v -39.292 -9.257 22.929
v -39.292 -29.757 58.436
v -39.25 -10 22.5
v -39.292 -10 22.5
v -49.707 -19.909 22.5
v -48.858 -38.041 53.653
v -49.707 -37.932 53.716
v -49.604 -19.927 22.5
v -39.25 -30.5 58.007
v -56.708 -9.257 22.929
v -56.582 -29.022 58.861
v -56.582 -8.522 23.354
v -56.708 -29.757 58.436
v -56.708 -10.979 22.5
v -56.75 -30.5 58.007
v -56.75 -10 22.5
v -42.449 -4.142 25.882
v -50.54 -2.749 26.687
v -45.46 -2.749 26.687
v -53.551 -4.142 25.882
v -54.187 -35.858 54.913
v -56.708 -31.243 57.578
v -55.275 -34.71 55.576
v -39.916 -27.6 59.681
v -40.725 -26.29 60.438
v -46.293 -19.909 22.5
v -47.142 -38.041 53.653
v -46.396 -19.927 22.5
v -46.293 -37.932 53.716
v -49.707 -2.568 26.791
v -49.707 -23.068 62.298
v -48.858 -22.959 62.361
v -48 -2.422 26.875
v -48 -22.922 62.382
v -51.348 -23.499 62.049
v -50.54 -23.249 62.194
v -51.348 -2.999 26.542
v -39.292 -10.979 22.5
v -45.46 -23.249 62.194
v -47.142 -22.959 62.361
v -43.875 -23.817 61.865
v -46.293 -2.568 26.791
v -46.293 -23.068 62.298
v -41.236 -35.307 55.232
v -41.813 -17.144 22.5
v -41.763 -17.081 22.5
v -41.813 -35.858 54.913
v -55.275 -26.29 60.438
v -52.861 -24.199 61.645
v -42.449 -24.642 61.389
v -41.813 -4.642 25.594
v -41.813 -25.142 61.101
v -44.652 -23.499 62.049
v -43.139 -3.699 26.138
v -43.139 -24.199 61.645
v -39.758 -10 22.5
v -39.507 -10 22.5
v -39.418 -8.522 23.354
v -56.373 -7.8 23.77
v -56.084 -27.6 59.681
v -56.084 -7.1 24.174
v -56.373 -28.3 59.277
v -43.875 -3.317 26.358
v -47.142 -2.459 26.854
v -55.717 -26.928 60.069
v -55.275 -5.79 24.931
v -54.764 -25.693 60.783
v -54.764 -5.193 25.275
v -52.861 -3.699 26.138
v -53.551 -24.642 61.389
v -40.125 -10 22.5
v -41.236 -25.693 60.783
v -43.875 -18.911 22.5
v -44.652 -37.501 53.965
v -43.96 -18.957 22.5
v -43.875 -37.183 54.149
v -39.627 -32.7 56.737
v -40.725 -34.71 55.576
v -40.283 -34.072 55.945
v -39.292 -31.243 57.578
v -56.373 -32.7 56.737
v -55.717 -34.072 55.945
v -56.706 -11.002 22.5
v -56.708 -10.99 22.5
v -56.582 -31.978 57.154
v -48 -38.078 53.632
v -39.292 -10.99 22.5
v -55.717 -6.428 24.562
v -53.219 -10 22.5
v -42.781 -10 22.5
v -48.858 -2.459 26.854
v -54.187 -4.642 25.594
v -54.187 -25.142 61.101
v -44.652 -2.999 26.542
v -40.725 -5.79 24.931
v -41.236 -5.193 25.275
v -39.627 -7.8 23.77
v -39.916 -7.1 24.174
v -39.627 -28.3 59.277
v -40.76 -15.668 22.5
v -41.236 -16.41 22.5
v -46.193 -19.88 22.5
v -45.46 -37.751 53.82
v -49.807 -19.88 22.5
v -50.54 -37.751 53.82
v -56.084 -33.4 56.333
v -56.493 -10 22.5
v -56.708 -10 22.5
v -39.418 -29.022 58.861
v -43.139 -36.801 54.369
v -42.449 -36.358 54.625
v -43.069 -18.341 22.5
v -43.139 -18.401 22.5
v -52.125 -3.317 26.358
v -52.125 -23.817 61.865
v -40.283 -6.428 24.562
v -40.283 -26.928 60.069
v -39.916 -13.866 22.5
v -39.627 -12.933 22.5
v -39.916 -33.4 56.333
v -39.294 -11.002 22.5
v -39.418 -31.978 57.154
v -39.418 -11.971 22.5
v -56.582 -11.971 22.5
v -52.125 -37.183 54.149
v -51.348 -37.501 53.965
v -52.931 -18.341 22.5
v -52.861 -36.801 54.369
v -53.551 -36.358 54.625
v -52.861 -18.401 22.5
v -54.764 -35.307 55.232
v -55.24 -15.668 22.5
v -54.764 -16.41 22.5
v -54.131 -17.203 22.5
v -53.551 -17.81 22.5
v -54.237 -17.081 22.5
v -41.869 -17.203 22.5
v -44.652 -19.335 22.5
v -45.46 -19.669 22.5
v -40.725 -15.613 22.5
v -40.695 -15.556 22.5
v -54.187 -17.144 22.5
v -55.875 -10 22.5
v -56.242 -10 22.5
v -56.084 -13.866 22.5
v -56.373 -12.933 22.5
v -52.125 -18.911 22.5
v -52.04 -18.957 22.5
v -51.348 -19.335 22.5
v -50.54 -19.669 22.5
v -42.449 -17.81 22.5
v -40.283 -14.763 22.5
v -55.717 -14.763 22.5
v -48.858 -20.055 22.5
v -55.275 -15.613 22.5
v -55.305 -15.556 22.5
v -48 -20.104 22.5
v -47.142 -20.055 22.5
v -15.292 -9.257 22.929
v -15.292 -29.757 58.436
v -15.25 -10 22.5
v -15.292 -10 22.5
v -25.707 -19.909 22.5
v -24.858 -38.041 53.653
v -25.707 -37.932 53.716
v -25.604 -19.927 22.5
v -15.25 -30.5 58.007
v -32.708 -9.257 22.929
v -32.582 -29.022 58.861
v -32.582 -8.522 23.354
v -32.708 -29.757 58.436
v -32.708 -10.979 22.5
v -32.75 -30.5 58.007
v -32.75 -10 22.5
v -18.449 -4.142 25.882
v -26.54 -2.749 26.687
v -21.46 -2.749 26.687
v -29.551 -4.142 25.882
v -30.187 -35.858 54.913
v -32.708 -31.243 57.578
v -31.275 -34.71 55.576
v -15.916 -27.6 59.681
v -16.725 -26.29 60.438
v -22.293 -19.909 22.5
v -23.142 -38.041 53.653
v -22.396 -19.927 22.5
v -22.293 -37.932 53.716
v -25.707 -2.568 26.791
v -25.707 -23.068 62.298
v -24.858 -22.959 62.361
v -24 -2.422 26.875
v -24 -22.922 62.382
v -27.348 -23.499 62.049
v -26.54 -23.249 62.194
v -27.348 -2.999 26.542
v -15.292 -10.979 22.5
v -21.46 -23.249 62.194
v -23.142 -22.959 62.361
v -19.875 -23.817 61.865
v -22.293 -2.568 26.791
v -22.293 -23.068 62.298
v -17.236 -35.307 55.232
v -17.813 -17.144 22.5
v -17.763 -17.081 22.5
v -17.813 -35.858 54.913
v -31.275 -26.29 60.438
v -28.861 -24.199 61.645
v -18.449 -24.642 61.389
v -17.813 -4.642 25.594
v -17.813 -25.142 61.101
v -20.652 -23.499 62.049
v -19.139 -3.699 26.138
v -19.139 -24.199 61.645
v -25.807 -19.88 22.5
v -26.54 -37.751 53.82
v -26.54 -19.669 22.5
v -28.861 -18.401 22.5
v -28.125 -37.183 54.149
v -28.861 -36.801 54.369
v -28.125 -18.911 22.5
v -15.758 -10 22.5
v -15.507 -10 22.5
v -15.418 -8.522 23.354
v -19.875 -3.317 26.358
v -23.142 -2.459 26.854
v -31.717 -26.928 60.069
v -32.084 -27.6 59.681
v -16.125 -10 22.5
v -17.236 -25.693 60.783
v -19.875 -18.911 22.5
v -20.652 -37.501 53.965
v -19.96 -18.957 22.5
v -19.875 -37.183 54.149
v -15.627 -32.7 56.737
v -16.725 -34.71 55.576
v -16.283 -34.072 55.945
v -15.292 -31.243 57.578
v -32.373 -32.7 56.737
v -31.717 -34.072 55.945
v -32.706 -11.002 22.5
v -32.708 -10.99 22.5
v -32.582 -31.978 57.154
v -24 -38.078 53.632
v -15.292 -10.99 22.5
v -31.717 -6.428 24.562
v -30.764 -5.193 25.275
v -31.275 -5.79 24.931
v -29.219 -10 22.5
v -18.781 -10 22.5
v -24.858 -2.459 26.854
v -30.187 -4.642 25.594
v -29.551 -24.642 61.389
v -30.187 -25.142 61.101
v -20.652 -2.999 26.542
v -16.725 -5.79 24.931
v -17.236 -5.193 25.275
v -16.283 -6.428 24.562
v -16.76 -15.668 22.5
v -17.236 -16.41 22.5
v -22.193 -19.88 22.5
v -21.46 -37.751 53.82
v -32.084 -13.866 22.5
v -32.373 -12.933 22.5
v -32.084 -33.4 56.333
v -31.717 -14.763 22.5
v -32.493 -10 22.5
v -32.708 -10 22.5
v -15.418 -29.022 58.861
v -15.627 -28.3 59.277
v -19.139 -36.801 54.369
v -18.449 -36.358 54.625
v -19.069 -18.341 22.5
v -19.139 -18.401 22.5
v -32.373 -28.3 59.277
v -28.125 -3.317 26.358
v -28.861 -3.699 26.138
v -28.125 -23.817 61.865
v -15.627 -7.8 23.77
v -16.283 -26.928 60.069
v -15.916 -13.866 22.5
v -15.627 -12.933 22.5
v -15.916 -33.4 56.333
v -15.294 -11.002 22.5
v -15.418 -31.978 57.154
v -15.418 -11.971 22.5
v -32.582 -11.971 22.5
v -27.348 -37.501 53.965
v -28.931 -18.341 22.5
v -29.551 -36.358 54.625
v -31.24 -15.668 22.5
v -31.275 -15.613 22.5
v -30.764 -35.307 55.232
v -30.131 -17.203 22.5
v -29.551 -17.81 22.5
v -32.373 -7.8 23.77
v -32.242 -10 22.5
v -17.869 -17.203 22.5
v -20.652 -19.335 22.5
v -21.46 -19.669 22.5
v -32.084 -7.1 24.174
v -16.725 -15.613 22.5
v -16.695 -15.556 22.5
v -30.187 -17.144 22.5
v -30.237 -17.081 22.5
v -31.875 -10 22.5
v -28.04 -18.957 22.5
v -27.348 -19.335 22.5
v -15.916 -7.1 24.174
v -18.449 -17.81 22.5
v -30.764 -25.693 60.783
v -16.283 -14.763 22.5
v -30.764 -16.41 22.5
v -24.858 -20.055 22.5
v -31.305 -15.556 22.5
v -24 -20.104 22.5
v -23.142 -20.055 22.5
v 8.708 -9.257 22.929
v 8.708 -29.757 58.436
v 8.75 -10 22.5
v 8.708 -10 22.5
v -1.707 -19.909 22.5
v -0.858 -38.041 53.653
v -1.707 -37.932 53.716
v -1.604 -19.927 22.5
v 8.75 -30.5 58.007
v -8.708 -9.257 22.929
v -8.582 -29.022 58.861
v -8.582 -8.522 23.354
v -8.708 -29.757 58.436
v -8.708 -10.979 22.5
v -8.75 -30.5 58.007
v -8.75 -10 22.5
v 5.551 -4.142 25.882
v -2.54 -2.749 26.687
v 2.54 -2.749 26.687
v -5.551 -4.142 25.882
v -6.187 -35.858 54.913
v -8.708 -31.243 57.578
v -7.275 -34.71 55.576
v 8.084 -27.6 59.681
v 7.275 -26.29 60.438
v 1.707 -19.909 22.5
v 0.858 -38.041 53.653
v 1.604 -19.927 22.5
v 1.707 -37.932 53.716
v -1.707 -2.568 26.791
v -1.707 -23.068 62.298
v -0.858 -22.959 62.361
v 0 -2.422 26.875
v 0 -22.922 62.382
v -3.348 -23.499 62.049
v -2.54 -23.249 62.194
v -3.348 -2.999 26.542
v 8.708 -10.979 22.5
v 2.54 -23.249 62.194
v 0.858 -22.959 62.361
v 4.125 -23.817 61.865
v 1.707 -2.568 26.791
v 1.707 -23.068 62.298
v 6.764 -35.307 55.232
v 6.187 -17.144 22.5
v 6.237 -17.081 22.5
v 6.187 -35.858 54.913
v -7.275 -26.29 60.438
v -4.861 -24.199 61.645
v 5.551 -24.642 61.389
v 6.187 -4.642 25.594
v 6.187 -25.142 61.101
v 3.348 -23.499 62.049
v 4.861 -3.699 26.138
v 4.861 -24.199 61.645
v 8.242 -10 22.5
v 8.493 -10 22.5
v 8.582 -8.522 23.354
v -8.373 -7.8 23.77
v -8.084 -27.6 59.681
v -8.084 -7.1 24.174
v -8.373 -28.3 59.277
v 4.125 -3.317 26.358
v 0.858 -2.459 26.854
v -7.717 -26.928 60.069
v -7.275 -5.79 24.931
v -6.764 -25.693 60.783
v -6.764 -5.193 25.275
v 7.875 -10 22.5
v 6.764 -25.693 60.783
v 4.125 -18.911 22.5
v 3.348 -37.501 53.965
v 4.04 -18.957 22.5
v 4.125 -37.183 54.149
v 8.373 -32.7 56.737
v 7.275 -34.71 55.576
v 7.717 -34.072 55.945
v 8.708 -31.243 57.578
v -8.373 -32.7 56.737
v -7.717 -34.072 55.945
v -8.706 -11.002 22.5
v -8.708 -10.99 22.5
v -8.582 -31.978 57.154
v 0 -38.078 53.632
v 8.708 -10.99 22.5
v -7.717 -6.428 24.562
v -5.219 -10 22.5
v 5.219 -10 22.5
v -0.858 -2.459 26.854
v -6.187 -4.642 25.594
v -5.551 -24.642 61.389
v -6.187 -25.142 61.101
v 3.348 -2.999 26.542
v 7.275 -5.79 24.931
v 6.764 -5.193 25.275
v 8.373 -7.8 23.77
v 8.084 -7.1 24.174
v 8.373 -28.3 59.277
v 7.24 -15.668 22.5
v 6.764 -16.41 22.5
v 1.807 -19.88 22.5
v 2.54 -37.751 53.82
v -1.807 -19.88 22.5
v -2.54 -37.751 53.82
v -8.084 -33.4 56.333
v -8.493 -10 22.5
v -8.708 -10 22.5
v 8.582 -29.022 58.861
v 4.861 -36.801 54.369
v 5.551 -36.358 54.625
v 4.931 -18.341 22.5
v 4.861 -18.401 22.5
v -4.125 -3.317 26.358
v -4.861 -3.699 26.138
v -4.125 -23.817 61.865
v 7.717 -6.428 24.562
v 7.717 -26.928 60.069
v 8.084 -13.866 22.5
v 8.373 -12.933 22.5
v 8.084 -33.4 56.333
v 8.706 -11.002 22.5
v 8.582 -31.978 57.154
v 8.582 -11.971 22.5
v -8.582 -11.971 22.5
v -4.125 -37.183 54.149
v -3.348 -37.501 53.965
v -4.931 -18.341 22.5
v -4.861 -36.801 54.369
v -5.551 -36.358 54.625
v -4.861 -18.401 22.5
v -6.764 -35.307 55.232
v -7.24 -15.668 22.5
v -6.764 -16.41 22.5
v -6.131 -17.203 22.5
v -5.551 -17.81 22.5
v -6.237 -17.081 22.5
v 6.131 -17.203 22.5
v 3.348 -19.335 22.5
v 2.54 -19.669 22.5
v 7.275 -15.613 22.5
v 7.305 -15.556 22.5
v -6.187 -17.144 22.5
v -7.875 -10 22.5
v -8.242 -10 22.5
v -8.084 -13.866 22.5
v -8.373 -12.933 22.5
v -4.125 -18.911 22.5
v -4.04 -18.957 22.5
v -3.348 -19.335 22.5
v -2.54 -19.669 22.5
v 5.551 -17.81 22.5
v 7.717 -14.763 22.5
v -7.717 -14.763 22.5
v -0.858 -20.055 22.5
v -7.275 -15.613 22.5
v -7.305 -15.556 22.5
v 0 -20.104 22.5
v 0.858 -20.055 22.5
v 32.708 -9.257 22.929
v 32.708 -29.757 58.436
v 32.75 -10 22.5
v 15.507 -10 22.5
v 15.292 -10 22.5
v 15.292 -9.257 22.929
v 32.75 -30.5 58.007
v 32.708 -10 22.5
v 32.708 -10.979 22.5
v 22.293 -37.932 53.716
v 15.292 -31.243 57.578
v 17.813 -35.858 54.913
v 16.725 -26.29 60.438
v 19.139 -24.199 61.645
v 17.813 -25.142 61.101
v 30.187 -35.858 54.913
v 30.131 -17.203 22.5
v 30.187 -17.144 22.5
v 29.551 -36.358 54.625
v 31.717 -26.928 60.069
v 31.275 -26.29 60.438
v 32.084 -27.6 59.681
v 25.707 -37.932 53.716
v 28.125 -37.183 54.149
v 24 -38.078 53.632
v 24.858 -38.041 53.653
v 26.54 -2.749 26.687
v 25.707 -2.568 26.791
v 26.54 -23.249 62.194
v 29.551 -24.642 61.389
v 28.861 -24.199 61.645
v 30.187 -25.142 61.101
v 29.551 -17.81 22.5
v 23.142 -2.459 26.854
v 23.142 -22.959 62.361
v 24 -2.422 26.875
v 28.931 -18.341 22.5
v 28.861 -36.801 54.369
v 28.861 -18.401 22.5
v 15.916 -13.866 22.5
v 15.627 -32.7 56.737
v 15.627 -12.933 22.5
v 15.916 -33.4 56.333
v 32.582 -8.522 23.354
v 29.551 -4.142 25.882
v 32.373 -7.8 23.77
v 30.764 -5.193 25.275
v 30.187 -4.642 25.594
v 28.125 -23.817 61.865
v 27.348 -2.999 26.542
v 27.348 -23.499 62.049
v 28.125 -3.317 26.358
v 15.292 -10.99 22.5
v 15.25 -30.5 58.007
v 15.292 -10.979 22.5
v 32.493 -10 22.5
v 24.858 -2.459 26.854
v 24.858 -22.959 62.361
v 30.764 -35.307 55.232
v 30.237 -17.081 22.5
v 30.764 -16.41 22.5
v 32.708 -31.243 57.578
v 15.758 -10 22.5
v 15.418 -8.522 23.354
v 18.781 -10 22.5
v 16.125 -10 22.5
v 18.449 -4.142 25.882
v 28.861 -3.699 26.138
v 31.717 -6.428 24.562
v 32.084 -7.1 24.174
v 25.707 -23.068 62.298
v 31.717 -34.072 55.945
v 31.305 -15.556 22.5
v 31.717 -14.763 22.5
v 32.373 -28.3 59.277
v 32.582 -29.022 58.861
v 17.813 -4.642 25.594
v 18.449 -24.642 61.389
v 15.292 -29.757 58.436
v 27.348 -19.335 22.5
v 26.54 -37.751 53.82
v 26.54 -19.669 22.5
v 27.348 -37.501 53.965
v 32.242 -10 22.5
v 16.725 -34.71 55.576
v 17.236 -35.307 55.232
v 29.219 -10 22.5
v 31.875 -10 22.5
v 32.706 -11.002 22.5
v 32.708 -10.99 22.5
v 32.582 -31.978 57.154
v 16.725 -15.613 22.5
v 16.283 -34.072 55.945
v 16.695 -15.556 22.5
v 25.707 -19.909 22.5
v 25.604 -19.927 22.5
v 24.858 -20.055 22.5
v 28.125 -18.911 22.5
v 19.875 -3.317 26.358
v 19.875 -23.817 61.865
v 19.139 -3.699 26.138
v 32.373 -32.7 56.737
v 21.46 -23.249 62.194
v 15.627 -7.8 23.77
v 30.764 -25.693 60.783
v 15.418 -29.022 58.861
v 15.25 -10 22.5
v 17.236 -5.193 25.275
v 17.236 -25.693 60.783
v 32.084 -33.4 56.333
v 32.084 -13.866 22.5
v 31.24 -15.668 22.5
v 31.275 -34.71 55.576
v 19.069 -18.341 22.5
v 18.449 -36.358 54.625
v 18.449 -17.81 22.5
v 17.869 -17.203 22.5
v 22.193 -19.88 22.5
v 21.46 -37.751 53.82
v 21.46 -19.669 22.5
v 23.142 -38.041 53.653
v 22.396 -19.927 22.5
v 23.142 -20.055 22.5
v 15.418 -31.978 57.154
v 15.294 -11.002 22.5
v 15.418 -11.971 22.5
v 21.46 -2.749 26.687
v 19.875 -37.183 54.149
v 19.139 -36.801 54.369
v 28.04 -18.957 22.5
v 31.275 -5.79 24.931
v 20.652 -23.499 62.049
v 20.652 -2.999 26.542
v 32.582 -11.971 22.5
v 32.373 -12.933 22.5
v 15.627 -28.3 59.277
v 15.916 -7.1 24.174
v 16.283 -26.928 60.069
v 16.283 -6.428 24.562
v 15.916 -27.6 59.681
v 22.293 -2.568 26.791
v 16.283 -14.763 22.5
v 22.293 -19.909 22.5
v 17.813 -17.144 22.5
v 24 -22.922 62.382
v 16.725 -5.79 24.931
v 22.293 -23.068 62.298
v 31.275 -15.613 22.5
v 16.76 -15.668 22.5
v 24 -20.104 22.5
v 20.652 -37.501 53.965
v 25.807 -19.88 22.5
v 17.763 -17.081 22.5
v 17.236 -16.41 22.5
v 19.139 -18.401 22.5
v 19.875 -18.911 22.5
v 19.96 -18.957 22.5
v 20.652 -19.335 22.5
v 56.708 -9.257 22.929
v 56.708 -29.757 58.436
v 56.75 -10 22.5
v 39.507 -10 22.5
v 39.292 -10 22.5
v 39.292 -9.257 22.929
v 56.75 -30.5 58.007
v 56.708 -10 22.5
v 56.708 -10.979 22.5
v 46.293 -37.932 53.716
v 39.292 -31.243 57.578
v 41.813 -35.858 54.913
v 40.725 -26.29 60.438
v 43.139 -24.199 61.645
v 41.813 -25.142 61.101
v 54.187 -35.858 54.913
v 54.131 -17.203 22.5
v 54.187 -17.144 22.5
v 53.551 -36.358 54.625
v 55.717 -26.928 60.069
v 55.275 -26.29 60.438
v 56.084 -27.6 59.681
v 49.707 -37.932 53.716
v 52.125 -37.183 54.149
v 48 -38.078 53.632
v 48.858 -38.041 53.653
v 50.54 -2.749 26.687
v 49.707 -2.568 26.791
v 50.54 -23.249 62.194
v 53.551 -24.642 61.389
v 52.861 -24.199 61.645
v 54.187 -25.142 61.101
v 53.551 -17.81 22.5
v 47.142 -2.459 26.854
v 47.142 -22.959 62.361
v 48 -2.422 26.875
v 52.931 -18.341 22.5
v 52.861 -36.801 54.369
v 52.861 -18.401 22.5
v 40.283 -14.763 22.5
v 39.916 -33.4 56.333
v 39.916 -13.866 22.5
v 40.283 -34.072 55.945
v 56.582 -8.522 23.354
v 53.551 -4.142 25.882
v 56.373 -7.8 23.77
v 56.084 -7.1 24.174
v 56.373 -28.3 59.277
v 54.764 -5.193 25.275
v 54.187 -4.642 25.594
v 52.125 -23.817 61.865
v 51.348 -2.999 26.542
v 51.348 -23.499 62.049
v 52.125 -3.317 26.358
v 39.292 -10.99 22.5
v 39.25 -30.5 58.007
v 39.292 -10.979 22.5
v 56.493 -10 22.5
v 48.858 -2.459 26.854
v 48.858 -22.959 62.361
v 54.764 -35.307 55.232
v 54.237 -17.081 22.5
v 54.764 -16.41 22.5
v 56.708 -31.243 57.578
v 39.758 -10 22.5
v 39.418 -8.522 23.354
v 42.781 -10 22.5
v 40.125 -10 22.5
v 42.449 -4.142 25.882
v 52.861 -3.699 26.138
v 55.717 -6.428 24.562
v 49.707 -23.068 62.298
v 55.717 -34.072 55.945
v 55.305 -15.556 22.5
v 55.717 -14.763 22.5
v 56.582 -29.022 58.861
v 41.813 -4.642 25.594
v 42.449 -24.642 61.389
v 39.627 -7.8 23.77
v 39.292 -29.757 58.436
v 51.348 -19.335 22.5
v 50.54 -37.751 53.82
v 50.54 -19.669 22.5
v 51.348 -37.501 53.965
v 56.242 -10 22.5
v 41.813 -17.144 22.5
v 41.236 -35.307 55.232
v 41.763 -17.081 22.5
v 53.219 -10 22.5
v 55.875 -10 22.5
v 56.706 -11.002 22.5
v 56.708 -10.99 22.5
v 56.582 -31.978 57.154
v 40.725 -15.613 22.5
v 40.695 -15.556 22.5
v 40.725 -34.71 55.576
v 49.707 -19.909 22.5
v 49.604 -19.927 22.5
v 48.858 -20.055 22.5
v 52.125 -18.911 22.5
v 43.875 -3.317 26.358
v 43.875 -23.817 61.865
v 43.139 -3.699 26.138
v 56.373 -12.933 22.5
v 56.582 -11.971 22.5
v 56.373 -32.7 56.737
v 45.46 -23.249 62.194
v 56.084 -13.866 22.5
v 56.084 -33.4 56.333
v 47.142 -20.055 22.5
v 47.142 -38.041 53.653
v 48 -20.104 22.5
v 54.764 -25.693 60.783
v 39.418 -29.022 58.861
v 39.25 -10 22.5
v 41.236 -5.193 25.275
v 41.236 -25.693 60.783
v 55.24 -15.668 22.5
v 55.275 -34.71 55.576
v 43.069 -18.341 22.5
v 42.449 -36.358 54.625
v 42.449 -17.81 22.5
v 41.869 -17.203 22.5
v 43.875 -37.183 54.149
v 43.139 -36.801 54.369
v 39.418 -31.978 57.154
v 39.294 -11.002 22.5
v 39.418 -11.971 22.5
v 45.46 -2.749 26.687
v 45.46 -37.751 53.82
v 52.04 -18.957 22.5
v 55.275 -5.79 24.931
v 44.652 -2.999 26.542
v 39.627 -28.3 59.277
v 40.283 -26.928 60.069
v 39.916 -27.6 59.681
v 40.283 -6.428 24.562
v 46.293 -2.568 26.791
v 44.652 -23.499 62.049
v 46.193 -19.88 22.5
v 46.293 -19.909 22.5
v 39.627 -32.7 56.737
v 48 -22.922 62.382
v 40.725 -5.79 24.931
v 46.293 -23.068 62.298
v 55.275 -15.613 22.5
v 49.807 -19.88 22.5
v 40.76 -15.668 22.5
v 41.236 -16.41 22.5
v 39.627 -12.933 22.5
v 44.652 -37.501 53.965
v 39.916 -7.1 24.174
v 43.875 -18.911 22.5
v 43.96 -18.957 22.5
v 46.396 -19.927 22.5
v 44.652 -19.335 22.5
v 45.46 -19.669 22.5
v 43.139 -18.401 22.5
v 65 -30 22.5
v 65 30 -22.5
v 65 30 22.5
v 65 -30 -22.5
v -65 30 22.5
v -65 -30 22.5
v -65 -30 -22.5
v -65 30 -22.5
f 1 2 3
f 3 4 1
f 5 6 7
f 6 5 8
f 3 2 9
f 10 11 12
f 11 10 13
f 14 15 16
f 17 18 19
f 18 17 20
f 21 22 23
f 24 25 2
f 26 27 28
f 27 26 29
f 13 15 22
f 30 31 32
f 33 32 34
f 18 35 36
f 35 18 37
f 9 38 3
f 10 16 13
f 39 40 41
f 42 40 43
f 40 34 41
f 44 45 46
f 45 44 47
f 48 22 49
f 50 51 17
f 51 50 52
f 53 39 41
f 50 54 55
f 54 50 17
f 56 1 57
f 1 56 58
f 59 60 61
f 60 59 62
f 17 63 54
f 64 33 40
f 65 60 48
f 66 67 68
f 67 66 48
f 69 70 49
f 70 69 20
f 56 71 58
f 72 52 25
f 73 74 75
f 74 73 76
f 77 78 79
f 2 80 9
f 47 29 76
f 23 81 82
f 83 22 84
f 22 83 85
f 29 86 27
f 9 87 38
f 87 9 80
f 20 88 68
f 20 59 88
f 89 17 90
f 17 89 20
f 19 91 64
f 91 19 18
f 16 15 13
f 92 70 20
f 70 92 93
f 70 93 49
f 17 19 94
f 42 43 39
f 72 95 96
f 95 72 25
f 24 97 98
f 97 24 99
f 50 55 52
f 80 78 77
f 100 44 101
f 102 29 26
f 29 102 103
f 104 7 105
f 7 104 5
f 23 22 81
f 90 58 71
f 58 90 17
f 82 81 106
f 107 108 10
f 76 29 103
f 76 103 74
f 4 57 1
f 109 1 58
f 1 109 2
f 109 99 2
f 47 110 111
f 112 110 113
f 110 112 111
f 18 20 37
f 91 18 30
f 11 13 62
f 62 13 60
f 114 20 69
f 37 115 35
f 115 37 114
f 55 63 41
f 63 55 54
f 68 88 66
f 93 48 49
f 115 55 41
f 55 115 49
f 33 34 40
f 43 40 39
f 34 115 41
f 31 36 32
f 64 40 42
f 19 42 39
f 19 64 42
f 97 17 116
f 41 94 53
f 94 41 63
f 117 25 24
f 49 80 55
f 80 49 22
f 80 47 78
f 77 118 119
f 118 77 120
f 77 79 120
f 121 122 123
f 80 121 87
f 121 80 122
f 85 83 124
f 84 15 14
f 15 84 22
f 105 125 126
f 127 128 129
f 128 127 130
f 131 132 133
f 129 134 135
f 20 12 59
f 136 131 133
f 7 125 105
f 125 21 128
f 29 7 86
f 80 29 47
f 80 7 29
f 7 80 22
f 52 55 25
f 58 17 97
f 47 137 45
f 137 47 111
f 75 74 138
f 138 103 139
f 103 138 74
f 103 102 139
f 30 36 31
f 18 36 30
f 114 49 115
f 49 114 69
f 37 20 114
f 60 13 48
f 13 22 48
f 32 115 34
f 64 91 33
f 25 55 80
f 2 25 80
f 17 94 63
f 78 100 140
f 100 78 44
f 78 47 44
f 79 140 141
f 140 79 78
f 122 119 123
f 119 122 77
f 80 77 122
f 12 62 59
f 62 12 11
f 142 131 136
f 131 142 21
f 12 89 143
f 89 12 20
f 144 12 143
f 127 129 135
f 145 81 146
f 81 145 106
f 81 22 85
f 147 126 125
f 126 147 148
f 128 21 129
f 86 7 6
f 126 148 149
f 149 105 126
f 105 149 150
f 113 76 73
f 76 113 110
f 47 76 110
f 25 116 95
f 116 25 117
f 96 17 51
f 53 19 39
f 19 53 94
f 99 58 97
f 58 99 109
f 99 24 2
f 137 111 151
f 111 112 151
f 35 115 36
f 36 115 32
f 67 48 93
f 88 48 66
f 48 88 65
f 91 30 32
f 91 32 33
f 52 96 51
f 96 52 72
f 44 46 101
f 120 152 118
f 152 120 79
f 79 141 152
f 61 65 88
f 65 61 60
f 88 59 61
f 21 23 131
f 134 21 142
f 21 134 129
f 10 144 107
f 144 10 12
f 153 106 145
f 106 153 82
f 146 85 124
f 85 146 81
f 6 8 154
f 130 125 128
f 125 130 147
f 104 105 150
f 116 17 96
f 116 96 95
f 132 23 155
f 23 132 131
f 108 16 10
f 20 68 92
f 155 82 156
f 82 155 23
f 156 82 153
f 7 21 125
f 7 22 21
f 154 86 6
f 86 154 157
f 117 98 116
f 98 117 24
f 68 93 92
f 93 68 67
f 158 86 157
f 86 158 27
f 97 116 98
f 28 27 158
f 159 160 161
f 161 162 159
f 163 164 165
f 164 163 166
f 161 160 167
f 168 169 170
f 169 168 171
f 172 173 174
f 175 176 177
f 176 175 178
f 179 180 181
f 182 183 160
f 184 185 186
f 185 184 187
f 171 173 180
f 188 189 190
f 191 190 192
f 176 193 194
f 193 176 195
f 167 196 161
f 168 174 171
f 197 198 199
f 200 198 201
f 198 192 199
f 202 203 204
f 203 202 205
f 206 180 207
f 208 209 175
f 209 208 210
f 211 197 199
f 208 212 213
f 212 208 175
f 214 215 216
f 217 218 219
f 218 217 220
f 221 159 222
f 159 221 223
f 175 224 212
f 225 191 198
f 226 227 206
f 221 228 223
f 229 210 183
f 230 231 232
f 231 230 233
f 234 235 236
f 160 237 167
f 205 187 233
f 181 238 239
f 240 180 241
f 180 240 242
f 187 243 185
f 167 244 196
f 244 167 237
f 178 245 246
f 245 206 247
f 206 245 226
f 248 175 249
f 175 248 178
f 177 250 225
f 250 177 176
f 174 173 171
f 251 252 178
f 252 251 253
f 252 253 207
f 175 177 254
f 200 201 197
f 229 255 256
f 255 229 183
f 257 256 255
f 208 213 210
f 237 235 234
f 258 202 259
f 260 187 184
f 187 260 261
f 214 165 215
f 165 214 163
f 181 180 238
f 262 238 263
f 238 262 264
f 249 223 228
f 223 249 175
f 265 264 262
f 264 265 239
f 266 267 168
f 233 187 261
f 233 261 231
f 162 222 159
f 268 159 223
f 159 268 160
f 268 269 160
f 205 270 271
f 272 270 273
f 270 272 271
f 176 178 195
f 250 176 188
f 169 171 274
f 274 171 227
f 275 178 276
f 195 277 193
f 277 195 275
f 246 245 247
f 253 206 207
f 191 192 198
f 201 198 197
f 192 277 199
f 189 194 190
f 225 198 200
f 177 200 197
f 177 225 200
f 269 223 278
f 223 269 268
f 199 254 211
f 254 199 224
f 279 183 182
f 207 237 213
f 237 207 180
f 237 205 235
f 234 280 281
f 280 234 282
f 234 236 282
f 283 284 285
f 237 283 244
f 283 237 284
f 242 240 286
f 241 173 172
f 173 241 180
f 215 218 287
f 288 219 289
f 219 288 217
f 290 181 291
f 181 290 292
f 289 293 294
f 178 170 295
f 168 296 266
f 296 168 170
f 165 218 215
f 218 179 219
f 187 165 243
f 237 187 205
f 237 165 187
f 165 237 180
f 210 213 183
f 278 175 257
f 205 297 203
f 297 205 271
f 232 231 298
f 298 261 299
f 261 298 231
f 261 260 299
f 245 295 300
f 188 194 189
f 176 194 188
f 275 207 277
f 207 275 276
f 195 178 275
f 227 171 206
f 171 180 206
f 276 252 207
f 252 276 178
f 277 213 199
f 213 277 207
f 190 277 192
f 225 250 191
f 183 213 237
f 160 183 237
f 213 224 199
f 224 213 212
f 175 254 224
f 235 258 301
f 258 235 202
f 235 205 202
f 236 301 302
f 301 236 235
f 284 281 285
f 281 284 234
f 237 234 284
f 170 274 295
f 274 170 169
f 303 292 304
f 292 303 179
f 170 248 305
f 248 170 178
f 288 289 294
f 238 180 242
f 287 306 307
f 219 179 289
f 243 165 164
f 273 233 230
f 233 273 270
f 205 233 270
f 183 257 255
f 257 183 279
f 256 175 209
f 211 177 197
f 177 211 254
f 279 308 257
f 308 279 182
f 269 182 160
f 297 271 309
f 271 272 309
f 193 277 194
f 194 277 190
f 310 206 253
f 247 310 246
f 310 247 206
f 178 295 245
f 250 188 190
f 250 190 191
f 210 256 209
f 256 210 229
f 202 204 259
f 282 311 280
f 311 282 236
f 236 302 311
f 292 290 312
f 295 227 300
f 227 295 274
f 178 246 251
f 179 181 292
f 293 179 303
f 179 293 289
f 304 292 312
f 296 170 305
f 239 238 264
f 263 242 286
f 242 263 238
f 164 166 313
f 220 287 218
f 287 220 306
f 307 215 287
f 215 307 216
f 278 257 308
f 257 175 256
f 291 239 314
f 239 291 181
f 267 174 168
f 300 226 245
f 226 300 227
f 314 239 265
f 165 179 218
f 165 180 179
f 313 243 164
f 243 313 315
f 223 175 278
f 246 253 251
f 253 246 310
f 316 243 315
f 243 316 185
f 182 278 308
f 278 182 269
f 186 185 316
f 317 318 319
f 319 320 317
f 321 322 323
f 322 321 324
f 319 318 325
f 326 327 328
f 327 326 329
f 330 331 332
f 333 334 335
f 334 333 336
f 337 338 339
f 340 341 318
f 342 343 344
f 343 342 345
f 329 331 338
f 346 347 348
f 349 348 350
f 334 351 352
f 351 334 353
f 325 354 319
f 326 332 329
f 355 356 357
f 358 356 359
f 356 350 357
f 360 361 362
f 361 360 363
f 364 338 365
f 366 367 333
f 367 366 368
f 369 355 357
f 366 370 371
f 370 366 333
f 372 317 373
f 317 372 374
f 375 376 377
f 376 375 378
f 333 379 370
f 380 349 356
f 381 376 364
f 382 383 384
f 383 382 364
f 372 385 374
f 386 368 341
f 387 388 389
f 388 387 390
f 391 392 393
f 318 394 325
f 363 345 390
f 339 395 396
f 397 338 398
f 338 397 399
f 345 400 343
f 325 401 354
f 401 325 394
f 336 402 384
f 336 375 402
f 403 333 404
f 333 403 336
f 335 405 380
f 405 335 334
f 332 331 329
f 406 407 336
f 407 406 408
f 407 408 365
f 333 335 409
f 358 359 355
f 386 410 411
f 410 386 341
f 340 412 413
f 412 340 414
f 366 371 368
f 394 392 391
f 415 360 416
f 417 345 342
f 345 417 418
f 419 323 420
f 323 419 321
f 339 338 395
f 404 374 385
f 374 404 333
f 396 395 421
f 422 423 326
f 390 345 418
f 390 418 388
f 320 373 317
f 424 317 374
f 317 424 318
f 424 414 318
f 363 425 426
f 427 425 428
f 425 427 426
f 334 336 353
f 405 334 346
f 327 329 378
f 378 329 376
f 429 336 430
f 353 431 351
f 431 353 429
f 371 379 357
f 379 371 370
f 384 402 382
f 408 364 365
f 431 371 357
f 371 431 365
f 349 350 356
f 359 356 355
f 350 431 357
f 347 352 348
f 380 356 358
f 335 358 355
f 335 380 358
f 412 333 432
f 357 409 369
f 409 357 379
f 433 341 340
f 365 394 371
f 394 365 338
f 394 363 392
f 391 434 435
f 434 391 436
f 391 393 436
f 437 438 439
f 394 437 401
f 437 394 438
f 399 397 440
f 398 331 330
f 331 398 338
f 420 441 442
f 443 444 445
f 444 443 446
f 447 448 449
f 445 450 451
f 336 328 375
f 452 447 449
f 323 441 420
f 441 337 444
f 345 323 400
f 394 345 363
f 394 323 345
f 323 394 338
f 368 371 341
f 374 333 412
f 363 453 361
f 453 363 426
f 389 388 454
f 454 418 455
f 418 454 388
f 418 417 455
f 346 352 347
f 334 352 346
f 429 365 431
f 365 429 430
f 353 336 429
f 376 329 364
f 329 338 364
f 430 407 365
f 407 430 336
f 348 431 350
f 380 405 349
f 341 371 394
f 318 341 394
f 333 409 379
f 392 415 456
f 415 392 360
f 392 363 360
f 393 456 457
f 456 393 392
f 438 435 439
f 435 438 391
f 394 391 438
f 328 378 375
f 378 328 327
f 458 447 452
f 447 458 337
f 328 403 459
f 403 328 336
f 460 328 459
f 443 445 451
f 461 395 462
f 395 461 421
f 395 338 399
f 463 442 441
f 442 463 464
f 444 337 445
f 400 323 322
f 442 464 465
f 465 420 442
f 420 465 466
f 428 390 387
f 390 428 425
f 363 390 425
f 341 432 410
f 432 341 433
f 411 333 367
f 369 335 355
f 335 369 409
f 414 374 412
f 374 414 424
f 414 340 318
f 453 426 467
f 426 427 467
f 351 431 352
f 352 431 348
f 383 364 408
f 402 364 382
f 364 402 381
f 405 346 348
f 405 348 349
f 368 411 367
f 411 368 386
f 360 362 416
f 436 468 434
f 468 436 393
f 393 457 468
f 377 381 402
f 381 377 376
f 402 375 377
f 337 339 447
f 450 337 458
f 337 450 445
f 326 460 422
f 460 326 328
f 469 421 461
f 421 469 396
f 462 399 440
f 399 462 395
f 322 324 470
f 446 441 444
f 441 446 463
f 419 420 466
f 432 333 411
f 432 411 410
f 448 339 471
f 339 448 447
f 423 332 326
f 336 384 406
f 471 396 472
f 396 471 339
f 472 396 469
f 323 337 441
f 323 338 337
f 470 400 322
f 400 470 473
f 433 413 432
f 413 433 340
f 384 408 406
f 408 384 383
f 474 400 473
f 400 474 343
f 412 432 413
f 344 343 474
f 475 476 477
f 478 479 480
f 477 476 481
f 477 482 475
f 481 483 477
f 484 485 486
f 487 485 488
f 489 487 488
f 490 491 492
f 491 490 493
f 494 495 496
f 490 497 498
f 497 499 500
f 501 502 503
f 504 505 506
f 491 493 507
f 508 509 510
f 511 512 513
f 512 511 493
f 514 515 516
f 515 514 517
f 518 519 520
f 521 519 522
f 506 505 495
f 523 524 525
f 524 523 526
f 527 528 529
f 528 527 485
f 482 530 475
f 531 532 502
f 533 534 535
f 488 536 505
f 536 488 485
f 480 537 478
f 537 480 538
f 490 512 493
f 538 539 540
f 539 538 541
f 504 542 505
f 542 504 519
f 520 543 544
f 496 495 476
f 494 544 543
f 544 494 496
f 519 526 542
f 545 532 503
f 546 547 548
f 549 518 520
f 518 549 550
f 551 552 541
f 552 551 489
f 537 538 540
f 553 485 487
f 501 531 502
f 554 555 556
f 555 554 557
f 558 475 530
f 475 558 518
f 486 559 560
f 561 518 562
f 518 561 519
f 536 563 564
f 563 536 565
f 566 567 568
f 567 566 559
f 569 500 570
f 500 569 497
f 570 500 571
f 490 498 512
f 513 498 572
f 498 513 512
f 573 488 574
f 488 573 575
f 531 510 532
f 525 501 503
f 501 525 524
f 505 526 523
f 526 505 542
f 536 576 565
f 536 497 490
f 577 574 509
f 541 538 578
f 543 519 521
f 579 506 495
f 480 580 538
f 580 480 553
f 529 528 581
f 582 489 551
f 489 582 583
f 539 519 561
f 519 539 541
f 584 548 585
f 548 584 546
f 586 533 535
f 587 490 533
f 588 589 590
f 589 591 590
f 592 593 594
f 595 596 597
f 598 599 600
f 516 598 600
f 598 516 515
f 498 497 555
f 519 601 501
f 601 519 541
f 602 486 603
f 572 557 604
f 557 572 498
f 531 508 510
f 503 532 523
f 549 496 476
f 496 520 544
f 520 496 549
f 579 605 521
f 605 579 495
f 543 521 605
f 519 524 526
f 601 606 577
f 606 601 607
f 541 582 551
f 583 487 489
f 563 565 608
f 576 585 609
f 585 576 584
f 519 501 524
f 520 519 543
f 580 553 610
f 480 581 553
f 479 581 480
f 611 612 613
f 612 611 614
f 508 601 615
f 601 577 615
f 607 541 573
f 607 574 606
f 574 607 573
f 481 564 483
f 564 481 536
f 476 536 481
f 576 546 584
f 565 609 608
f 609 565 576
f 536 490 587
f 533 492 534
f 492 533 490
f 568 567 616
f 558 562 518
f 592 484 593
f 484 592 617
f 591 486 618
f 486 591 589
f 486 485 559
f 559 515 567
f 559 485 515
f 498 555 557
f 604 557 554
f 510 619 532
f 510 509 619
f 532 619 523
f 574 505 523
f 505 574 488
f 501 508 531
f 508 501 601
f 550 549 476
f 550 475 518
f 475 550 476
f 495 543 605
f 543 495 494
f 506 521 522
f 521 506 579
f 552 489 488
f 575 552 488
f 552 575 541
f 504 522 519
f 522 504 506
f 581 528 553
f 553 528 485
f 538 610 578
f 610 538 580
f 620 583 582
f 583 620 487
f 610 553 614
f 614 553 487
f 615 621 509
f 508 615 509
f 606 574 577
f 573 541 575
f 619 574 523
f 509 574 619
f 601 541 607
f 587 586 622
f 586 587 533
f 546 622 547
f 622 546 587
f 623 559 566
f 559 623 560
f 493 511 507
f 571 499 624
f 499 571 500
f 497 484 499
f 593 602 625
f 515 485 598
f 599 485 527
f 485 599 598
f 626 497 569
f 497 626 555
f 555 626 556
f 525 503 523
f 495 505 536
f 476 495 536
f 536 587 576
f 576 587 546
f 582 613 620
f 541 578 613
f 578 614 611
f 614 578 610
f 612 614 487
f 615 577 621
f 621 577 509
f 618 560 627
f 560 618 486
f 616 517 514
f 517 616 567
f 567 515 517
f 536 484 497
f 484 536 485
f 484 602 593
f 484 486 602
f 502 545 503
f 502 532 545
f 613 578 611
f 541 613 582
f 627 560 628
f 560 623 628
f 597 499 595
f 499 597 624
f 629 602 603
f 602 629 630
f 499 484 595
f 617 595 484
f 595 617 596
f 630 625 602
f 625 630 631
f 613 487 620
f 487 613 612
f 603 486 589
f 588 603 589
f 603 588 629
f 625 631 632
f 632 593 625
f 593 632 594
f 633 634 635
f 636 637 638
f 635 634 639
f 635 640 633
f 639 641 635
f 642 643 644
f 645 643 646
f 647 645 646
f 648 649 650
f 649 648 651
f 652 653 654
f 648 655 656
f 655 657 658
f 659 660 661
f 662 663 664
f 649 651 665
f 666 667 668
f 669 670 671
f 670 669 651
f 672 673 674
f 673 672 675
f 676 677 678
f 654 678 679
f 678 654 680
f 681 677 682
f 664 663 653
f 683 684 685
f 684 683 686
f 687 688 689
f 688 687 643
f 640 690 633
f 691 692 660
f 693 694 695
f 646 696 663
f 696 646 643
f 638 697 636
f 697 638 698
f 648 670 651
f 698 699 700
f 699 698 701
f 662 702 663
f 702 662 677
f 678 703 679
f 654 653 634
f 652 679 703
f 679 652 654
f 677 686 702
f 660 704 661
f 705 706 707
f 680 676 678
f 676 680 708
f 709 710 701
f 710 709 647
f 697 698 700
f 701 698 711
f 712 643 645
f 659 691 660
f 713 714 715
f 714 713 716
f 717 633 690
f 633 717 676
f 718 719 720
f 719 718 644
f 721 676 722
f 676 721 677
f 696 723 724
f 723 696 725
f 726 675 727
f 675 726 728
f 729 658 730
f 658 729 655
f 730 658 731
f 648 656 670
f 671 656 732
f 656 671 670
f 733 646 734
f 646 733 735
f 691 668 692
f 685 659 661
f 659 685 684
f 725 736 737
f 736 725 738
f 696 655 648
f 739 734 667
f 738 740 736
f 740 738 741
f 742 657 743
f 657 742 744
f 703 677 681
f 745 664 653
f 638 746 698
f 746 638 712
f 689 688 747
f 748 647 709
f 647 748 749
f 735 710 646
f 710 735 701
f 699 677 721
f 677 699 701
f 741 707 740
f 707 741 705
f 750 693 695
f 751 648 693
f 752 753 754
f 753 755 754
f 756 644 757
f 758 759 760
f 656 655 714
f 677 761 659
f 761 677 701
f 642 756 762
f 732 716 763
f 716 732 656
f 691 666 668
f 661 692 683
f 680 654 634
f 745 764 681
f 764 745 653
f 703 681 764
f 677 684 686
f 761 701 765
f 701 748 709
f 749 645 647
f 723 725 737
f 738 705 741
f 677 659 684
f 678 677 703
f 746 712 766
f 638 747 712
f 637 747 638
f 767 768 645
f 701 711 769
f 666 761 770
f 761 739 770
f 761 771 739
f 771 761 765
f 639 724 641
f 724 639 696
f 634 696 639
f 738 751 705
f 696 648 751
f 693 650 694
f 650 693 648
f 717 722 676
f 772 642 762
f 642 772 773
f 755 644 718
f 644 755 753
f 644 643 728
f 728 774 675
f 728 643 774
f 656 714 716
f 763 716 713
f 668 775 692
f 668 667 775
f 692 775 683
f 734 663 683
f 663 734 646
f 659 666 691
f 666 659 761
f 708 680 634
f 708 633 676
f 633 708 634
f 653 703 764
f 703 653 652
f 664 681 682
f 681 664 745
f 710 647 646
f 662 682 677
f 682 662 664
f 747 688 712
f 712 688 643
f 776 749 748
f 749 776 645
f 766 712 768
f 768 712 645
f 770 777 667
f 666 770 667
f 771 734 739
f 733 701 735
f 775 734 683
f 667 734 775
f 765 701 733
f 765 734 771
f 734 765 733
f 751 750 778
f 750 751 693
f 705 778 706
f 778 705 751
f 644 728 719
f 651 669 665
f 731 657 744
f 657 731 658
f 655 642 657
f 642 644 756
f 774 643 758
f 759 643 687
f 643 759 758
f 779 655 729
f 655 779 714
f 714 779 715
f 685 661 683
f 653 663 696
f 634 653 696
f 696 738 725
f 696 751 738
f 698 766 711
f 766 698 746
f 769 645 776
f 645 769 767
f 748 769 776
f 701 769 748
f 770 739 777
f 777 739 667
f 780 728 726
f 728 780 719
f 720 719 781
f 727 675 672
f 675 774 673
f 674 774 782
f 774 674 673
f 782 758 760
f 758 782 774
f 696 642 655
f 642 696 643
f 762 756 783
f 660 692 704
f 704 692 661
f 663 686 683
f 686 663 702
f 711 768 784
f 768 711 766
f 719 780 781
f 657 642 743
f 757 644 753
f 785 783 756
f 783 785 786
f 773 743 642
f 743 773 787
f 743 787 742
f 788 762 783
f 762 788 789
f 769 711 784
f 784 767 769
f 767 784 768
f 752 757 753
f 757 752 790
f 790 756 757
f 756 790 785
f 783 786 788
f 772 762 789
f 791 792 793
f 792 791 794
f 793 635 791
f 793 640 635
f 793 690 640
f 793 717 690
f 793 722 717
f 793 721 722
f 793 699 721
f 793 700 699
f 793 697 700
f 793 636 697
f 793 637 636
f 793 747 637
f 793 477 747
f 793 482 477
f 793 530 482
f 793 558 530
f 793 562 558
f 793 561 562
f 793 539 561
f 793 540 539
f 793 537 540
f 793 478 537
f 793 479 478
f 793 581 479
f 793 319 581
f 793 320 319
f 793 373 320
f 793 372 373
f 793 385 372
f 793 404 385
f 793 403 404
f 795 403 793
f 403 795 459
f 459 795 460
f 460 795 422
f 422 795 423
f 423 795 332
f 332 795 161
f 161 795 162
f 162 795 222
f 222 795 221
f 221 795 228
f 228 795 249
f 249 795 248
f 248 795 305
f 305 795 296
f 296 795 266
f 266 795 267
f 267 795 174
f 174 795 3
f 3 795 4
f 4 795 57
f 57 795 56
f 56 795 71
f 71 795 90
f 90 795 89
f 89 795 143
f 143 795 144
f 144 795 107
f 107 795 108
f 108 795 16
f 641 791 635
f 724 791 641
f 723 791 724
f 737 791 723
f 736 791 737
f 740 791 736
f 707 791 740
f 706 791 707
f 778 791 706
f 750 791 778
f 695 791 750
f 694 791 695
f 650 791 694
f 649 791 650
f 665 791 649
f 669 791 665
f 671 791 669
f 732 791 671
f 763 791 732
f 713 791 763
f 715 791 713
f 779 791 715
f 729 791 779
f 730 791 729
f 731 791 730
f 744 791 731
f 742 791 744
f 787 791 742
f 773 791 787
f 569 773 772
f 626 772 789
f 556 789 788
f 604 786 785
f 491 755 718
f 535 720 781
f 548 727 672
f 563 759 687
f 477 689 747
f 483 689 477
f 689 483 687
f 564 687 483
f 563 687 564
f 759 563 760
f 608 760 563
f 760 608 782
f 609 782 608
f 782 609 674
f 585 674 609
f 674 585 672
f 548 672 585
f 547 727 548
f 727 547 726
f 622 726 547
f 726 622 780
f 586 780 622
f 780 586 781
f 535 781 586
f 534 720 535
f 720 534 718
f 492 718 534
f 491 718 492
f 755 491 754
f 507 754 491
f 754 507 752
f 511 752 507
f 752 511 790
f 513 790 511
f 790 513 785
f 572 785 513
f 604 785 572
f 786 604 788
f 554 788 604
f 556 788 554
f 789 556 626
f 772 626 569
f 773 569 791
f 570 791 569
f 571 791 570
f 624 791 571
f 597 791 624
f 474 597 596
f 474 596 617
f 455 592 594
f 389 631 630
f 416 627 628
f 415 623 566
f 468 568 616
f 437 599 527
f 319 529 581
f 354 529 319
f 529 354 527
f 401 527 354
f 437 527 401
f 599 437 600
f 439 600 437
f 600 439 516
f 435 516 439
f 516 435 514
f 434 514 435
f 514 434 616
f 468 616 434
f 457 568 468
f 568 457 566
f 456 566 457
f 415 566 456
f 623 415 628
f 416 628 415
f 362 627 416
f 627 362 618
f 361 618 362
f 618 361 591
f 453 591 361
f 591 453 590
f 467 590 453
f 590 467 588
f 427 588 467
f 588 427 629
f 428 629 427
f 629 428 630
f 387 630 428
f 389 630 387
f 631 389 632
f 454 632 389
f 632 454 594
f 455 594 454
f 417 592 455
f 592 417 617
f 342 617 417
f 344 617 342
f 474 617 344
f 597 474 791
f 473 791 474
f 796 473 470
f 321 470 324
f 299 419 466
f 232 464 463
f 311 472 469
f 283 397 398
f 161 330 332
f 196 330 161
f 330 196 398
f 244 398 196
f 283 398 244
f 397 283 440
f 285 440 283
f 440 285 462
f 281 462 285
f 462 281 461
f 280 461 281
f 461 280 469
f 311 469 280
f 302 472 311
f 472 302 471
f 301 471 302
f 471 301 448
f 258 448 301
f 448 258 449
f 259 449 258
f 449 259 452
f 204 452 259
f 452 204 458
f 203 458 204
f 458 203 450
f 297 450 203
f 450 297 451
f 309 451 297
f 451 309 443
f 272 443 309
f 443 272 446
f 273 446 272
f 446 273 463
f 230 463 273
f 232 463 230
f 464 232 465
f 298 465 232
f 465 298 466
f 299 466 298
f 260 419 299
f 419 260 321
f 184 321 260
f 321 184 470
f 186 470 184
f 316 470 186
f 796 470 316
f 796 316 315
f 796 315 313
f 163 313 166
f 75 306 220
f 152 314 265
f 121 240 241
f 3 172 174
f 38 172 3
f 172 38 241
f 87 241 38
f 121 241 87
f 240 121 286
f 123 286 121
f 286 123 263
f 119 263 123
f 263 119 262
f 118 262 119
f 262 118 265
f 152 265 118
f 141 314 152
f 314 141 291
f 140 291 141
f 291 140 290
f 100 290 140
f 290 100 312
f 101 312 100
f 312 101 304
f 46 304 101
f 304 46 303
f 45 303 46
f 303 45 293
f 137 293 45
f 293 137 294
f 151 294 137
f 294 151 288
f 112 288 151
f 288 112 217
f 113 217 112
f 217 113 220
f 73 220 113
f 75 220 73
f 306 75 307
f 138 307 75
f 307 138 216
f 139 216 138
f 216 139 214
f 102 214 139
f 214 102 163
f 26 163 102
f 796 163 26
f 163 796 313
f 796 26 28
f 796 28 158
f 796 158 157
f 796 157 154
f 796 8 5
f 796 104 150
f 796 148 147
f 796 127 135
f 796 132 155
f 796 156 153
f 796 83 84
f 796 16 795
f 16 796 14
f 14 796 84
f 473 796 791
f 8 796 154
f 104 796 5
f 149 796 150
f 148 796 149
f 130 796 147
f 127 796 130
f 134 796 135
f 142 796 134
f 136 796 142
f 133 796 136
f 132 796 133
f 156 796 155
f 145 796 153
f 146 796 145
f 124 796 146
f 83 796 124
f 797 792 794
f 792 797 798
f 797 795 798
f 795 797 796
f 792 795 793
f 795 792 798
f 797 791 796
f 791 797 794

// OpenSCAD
// Dimensions (mm)
block_length_x = 130;
block_depth_y = 60;
block_height_z = 45;

// Hole parameters
hole_diameter = 17.5;
hole_depth = 40;
hole_spacing_x = 24;
num_holes = 5;

// Tilt parameters
tilt_angle = 30; // degrees from vertical
top_face_y_offset = -10; // Y position on top face where axis intersects

// Rendering quality
$fn = 64;

// Main block
translate([0, 0, 0])
cube([block_length_x, block_depth_y, block_height_z], center = true);

// Holes
for (i = [-(num_holes-1)/2 : (num_holes-1)/2]) {
    x_pos = i * hole_spacing_x;
    
    // The axis intersects the top face at (x_pos, top_face_y_offset, block_height_z/2)
    // The hole is tilted 30 degrees from vertical in the YZ plane, moving toward +Y as it goes down
    
    // Calculate the center of the hole at the top face
    top_center = [x_pos, top_face_y_offset, block_height_z/2];
    
    // The hole axis direction: tilted 30 deg from vertical (+Z is up, so vertical is -Z direction into block)
    // In YZ plane: direction vector has components in +Y and -Z
    // angle from vertical = 30 deg, so from -Z axis, we rotate 30 deg toward +Y
    // Direction vector: (0, sin(30), -cos(30))
    
    // We need to create a cylinder along this axis
    // OpenSCAD cylinders are along Z axis by default, so we rotate it
    
    // Position the cylinder at the top center, then rotate it so its axis aligns with the tilt
    // The cylinder will be created along Z, then rotated around X axis by tilt_angle
    // But we need to be careful about the rotation center
    
    // Strategy: 
    // 1. Place cylinder center at top_center
    // 2. Rotate around X axis by tilt_angle (so it tilts toward +Y)
    // 3. The cylinder extends in -Z direction (into the block)
    
    // However, rotate_extrude and cylinder rotation can be tricky. Let's use a different approach:
    // Create the cylinder at origin, oriented along Z, then translate and rotate
    
    // The cylinder axis should go from top_center downward at 30 deg from vertical toward +Y
    // If we rotate a vertical cylinder (along -Z) by tilt_angle around the X axis, 
    // the top stays at top_center and the bottom moves toward +Y
    
    // For the difference operation, we need the cylinder to extend past the block
    // The hole depth is 40 mm along the axis, so we make the cylinder slightly longer
    
    translate(top_center)
    rotate([tilt_angle, 0, 0])
    cylinder(r = hole_diameter/2, h = hole_depth + 1, center = false);
}

// Apply the holes via difference
// Actually, we need to structure this properly with difference()
// Let me restructure the code:

// The above code won't work as written because we need difference()
// Let me rewrite properly:
